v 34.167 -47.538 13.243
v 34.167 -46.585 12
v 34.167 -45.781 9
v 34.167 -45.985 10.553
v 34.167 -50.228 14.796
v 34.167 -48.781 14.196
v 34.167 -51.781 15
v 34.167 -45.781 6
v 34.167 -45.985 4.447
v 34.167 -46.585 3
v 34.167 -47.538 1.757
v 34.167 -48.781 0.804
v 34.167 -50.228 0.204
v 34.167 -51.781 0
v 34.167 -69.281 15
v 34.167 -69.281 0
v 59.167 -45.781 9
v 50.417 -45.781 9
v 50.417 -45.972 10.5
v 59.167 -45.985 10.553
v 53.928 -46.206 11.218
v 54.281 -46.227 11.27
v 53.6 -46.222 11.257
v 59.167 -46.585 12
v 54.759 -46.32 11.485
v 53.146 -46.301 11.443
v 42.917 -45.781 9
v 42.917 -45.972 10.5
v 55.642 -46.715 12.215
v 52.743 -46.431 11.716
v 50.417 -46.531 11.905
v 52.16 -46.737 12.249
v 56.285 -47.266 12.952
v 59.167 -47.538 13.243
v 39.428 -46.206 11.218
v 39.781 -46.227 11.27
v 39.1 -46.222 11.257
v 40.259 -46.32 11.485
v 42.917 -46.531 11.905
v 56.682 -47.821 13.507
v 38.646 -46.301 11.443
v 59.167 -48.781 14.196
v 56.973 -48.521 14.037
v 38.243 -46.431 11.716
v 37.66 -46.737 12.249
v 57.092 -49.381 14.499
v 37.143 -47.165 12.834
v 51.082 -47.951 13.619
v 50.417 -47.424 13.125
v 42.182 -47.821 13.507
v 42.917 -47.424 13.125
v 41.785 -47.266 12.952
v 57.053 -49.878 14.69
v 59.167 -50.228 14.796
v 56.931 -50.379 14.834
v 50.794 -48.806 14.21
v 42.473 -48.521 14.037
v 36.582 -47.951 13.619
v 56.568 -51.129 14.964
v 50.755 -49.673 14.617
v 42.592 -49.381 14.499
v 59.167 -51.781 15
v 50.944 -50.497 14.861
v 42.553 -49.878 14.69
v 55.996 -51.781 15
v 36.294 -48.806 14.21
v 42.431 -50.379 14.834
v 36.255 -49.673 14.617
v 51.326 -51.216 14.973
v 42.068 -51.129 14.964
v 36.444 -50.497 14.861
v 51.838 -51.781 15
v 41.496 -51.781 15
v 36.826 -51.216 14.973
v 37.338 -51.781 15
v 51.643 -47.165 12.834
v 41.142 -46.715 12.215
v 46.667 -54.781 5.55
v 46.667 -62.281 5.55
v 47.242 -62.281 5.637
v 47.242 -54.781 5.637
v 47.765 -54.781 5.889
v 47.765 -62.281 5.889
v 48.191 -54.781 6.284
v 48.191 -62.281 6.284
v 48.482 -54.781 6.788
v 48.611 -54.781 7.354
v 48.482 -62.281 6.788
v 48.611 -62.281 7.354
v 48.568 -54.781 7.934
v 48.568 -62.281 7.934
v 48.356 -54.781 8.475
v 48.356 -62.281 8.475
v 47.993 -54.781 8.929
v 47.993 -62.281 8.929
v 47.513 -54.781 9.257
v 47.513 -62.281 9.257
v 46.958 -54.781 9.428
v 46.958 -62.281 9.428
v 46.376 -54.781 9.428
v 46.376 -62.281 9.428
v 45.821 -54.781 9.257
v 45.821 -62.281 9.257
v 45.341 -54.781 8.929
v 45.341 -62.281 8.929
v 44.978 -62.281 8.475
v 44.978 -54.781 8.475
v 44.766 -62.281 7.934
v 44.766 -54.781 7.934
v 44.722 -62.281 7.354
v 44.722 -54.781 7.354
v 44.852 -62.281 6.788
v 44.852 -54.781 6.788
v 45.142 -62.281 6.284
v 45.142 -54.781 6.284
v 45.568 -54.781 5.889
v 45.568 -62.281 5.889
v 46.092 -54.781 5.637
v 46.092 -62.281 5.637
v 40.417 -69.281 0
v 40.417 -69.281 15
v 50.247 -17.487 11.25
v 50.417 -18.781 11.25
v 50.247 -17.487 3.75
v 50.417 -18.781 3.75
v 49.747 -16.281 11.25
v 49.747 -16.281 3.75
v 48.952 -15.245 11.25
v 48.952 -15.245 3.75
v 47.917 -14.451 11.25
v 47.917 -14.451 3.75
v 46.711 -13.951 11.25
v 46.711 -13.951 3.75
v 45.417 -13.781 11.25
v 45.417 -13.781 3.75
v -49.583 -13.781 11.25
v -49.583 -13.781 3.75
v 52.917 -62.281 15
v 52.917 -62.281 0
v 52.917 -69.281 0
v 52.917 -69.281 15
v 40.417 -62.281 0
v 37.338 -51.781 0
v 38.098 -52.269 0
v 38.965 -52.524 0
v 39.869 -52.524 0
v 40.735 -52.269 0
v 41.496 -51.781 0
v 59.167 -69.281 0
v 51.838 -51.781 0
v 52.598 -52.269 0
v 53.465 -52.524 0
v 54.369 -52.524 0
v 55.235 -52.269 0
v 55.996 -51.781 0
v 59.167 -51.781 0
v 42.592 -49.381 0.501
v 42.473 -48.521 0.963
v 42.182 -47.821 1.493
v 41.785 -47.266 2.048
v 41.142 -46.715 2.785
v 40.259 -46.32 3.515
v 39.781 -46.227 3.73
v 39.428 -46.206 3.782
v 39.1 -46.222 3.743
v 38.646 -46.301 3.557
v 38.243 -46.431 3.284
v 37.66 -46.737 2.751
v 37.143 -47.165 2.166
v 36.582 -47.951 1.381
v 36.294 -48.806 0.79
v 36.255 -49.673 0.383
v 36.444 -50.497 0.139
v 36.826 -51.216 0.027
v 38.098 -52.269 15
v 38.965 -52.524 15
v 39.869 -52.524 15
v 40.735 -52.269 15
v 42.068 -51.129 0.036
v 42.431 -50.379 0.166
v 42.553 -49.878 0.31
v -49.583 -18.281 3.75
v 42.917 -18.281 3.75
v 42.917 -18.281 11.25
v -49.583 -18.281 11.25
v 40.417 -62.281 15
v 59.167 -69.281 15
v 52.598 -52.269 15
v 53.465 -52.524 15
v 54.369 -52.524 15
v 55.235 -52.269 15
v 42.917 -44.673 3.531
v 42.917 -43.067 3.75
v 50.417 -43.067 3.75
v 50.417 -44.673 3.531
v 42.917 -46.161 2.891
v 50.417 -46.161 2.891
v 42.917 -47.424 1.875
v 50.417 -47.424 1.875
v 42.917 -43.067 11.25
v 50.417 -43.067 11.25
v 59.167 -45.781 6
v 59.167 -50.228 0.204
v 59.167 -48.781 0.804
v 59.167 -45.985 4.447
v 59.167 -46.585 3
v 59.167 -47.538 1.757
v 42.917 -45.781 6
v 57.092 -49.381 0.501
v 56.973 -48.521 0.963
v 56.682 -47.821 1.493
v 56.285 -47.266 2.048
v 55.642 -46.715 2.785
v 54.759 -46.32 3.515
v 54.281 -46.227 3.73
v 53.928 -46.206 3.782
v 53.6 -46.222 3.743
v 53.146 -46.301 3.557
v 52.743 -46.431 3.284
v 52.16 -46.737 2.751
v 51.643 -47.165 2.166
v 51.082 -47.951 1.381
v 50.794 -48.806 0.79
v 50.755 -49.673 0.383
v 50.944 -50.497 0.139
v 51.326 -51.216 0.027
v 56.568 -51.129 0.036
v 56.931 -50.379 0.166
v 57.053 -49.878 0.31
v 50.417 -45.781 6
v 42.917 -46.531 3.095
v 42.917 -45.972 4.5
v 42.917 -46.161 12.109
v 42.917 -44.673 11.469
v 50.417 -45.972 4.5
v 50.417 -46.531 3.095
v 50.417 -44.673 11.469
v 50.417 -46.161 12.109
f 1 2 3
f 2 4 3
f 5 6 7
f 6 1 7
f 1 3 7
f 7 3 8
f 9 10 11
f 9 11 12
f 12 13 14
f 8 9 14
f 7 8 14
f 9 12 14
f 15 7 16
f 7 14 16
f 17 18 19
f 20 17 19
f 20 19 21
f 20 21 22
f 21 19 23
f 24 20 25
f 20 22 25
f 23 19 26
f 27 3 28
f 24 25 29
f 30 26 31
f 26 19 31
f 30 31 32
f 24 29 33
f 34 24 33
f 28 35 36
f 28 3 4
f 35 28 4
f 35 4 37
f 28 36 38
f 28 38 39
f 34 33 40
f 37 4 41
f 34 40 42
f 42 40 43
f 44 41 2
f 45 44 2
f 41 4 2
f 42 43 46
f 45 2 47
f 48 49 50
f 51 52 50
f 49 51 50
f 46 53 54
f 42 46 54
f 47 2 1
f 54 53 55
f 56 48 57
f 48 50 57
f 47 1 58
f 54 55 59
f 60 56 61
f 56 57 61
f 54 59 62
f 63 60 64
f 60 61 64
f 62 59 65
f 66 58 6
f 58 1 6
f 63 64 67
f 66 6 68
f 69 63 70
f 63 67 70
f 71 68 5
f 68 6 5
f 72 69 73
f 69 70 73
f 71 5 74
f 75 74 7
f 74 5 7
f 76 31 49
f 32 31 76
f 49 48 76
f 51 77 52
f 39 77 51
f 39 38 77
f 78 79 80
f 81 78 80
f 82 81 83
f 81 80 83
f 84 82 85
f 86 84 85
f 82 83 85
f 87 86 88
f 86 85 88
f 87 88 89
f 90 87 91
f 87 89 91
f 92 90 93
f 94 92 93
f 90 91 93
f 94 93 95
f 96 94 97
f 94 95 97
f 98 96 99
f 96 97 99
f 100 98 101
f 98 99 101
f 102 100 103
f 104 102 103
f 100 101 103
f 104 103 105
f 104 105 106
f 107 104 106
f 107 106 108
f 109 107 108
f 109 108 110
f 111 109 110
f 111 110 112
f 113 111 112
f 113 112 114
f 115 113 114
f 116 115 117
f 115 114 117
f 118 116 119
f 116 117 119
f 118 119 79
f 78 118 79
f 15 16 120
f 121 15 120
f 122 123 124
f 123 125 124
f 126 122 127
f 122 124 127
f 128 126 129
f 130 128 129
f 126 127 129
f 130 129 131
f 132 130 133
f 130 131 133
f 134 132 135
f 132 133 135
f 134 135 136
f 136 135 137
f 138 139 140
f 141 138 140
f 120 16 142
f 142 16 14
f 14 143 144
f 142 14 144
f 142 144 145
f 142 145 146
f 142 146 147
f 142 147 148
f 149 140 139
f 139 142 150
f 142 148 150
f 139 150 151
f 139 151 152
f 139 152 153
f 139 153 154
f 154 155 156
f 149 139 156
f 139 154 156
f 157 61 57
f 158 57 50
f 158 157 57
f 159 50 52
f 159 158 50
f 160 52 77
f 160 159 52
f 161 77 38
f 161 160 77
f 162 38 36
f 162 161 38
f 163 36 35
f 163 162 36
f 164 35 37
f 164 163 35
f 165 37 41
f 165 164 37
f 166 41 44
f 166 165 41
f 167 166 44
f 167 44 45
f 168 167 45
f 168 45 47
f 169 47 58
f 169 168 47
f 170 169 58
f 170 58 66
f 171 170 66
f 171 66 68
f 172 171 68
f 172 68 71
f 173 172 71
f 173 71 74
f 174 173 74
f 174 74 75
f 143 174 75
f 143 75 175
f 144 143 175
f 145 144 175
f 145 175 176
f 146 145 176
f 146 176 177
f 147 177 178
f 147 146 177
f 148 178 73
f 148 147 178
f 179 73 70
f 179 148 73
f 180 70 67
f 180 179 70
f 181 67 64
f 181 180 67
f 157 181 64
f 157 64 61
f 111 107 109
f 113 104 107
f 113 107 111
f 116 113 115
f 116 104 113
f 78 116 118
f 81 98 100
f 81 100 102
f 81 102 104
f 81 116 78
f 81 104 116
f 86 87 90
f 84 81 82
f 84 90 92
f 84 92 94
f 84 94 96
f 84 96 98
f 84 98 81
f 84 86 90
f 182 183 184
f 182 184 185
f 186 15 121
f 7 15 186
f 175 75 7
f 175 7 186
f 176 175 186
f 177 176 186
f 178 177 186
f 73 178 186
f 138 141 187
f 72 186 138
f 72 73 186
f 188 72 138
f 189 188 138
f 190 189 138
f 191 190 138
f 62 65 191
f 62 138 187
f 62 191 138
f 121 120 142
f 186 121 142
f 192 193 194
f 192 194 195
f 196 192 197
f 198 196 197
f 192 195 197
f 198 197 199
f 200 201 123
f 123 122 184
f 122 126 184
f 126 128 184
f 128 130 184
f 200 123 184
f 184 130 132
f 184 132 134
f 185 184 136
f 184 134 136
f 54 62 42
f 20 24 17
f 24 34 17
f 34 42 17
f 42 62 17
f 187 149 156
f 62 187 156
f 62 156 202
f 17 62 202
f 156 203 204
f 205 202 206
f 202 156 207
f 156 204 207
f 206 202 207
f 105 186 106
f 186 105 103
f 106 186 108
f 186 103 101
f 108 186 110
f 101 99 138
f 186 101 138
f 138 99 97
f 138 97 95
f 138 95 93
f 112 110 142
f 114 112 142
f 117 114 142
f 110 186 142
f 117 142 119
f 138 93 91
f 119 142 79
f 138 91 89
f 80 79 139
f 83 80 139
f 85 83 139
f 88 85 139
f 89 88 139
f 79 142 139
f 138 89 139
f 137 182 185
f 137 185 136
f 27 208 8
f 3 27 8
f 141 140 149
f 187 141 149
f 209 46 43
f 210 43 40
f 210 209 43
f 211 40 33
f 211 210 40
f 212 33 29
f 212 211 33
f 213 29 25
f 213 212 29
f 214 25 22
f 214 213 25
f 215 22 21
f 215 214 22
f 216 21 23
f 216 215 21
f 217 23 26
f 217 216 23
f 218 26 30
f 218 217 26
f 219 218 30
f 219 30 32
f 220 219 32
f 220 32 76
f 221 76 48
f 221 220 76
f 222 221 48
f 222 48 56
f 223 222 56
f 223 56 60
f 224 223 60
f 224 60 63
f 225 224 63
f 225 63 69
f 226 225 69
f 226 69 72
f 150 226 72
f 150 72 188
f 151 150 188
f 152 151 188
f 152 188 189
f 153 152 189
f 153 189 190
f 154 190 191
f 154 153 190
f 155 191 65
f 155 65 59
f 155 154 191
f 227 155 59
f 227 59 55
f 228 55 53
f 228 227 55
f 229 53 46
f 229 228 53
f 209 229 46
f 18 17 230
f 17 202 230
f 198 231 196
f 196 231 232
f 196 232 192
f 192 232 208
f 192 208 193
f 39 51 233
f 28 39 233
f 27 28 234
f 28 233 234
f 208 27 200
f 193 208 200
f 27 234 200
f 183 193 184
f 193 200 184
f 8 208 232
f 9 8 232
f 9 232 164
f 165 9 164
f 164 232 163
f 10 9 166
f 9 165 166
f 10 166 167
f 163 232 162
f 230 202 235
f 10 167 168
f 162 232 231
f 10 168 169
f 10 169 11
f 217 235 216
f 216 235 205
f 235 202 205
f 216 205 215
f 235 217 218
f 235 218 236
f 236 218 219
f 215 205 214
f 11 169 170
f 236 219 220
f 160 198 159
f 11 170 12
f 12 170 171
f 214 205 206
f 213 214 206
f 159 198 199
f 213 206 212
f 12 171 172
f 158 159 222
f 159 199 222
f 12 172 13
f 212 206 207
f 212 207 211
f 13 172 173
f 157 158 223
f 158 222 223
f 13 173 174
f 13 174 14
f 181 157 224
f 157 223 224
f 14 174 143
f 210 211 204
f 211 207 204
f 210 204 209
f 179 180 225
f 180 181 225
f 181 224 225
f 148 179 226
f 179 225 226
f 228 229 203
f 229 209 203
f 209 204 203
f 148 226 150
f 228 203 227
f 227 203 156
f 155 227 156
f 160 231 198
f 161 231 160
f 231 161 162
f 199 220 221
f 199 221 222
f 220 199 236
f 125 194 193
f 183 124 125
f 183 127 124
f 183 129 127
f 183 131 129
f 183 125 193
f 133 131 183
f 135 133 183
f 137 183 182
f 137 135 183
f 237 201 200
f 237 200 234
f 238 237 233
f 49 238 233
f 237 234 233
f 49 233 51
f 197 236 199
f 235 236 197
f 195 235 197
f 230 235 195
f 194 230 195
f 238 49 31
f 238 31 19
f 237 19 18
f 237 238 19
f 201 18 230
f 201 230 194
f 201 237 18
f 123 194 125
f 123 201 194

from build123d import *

# Parameters (mm, degrees)
SKETCH1_R           = 3.175
PUSHER_BASE_DEPTH   = 15
SKETCH3_R           = 1.95
SCREW_HOLE_DEPTH    = 7.5
SKETCH6_W           = 7.5
SKETCH6_H           = 32
PUSHER_HEAD_DEPTH   = 3.75
FILLET1_R           = 6
FILLET5_R           = 6
FILLET6_R           = 6
SKETCH8_W           = 92.5
SKETCH8_H           = 4.5
BOSS_EXTRUDE1_DEPTH = 7.5
FILLET7_R           = 5


with BuildPart() as part:
    # Sketch1 → pusher base (new body)
    with BuildSketch(Plane.XY):
        Polygon((59.166899441, -45.781018283), (51.666899441, -45.781018283), (41.666899441, -45.781018283), (34.166899441, -45.781018283), (34.166899441, -69.281018283), (40.416899441, -69.281018283), (40.416899441, -62.281018283), (52.916899441, -62.281018283), (52.916899441, -69.281018283), (59.166899441, -69.281018283), align=None)
        with Locations((39.416899441, -49.381018283)):
            Circle(SKETCH1_R, mode=Mode.SUBTRACT)
        with Locations((53.916899441, -49.381018283)):
            Circle(SKETCH1_R, mode=Mode.SUBTRACT)
    extrude(amount=PUSHER_BASE_DEPTH)

    # Sketch3 → screw hole (cut)
    with BuildSketch(Plane.XZ.offset(62.281018283)):
        with Locations(Location((46.666899441, 7.5, 0), (0, 0, 270))):
            Circle(SKETCH3_R)
    extrude(amount=-SCREW_HOLE_DEPTH, mode=Mode.SUBTRACT)

    # Sketch6 → pusher head (add, symmetric)
    with BuildSketch(Plane.XY.offset(7.5)):
        with Locations((46.666899441, -29.781018283)):
            Rectangle(SKETCH6_W, SKETCH6_H)
    extrude(amount=PUSHER_HEAD_DEPTH, both=True)

    # Fillet1
    # the kernel refuses this fillet: 6 mm, written as the material it takes off along each edge
    with BuildSketch(Plane(origin=(74.166899441, -45.781018283, 0), x_dir=(0, 0, 1), z_dir=(-1, 0, 0))) as fillet1_piece_1_section:
        with BuildLine():
            CenterArc((FILLET1_R, -FILLET1_R), FILLET1_R, 90, 90)
            Line((0, -FILLET1_R), (0, 0))
            Line((0, 0), (FILLET1_R, 0))
        make_face()
    fillet1_piece_1 = extrude(amount=55, mode=Mode.PRIVATE)
    fillet1_piece_1 = split(fillet1_piece_1, bisect_by=Plane(origin=(62.291899441, -45.824840722, 3.75), z_dir=(0, 0, 1)), keep=Keep.TOP, mode=Mode.PRIVATE)
    fillet1_piece_1 = split(fillet1_piece_1, bisect_by=Plane(origin=(50.416899441, -45.824840722, 4.566140917), z_dir=(1, 0, 0)), keep=Keep.TOP, mode=Mode.PRIVATE)
    add(fillet1_piece_1, mode=Mode.SUBTRACT)
    with BuildSketch(Plane(origin=(74.166899441, -45.781018283, 0), x_dir=(0, 0, 1), z_dir=(-1, 0, 0))) as fillet1_piece_2_section:
        with BuildLine():
            CenterArc((FILLET1_R, -FILLET1_R), FILLET1_R, 90, 90)
            Line((0, -FILLET1_R), (0, 0))
            Line((0, 0), (FILLET1_R, 0))
        make_face()
    fillet1_piece_2 = extrude(amount=55, mode=Mode.PRIVATE)
    fillet1_piece_2 = split(fillet1_piece_2, bisect_by=Plane(origin=(62.291899441, -47.230240291, 3.75), z_dir=(0, 0, -1)), keep=Keep.TOP, mode=Mode.PRIVATE)
    fillet1_piece_2 = split(fillet1_piece_2, bisect_by=Plane(origin=(50.416899441, -47.230240291, 1.136674626), z_dir=(1, 0, 0)), keep=Keep.TOP, mode=Mode.PRIVATE)
    add(fillet1_piece_2, mode=Mode.SUBTRACT)
    with BuildSketch(Plane(origin=(74.166899441, -45.781018283, 0), x_dir=(0, 0, 1), z_dir=(-1, 0, 0))) as fillet1_piece_3_section:
        with BuildLine():
            CenterArc((FILLET1_R, -FILLET1_R), FILLET1_R, 90, 90)
            Line((0, -FILLET1_R), (0, 0))
            Line((0, 0), (FILLET1_R, 0))
        make_face()
    fillet1_piece_3 = extrude(amount=55, mode=Mode.PRIVATE)
    fillet1_piece_3 = split(fillet1_piece_3, bisect_by=Plane(origin=(46.666899441, -47.230240291, 3.75), z_dir=(0, 0, -1)), keep=Keep.TOP, mode=Mode.PRIVATE)
    fillet1_piece_3 = split(fillet1_piece_3, bisect_by=Plane(origin=(50.416899441, -47.230240291, 1.136674626), z_dir=(-1, 0, 0)), keep=Keep.TOP, mode=Mode.PRIVATE)
    fillet1_piece_3 = split(fillet1_piece_3, bisect_by=Plane(origin=(42.916899441, -47.230240291, 1.136674626), z_dir=(1, 0, 0)), keep=Keep.TOP, mode=Mode.PRIVATE)
    add(fillet1_piece_3, mode=Mode.SUBTRACT)
    with BuildSketch(Plane(origin=(74.166899441, -45.781018283, 0), x_dir=(0, 0, 1), z_dir=(-1, 0, 0))) as fillet1_piece_4_section:
        with BuildLine():
            CenterArc((FILLET1_R, -FILLET1_R), FILLET1_R, 90, 90)
            Line((0, -FILLET1_R), (0, 0))
            Line((0, 0), (FILLET1_R, 0))
        make_face()
    fillet1_piece_4 = extrude(amount=55, mode=Mode.PRIVATE)
    fillet1_piece_4 = split(fillet1_piece_4, bisect_by=Plane(origin=(31.041899441, -45.824840722, 3.75), z_dir=(0, 0, 1)), keep=Keep.TOP, mode=Mode.PRIVATE)
    fillet1_piece_4 = split(fillet1_piece_4, bisect_by=Plane(origin=(42.916899441, -45.824840722, 4.566140917), z_dir=(-1, 0, 0)), keep=Keep.TOP, mode=Mode.PRIVATE)
    add(fillet1_piece_4, mode=Mode.SUBTRACT)
    with BuildSketch(Plane(origin=(74.166899441, -45.781018283, 0), x_dir=(0, 0, 1), z_dir=(-1, 0, 0))) as fillet1_piece_5_section:
        with BuildLine():
            CenterArc((FILLET1_R, -FILLET1_R), FILLET1_R, 90, 90)
            Line((0, -FILLET1_R), (0, 0))
            Line((0, 0), (FILLET1_R, 0))
        make_face()
    fillet1_piece_5 = extrude(amount=55, mode=Mode.PRIVATE)
    fillet1_piece_5 = split(fillet1_piece_5, bisect_by=Plane(origin=(31.041899441, -47.230240291, 3.75), z_dir=(0, 0, -1)), keep=Keep.TOP, mode=Mode.PRIVATE)
    fillet1_piece_5 = split(fillet1_piece_5, bisect_by=Plane(origin=(42.916899441, -47.230240291, 1.136674626), z_dir=(-1, 0, 0)), keep=Keep.TOP, mode=Mode.PRIVATE)
    add(fillet1_piece_5, mode=Mode.SUBTRACT)
    with BuildSketch(Plane(origin=(19.166899441, -45.781018283, 15), x_dir=(0, 0, -1), z_dir=(1, 0, 0))) as fillet1_piece_6_section:
        with BuildLine():
            CenterArc((FILLET1_R, -FILLET1_R), FILLET1_R, 90, 90)
            Line((0, -FILLET1_R), (0, 0))
            Line((0, 0), (FILLET1_R, 0))
        make_face()
    fillet1_piece_6 = extrude(amount=55, mode=Mode.PRIVATE)
    fillet1_piece_6 = split(fillet1_piece_6, bisect_by=Plane(origin=(31.041899441, -45.824840722, 11.25), z_dir=(0, 0, -1)), keep=Keep.TOP, mode=Mode.PRIVATE)
    fillet1_piece_6 = split(fillet1_piece_6, bisect_by=Plane(origin=(42.916899441, -45.824840722, 10.433859083), z_dir=(-1, 0, 0)), keep=Keep.TOP, mode=Mode.PRIVATE)
    add(fillet1_piece_6, mode=Mode.SUBTRACT)
    with BuildSketch(Plane(origin=(19.166899441, -45.781018283, 15), x_dir=(0, 0, -1), z_dir=(1, 0, 0))) as fillet1_piece_7_section:
        with BuildLine():
            CenterArc((FILLET1_R, -FILLET1_R), FILLET1_R, 90, 90)
            Line((0, -FILLET1_R), (0, 0))
            Line((0, 0), (FILLET1_R, 0))
        make_face()
    fillet1_piece_7 = extrude(amount=55, mode=Mode.PRIVATE)
    fillet1_piece_7 = split(fillet1_piece_7, bisect_by=Plane(origin=(31.041899441, -47.230240291, 11.25), z_dir=(0, 0, 1)), keep=Keep.TOP, mode=Mode.PRIVATE)
    fillet1_piece_7 = split(fillet1_piece_7, bisect_by=Plane(origin=(42.916899441, -47.230240291, 13.863325374), z_dir=(-1, 0, 0)), keep=Keep.TOP, mode=Mode.PRIVATE)
    add(fillet1_piece_7, mode=Mode.SUBTRACT)
    with BuildSketch(Plane(origin=(19.166899441, -45.781018283, 15), x_dir=(0, 0, -1), z_dir=(1, 0, 0))) as fillet1_piece_8_section:
        with BuildLine():
            CenterArc((FILLET1_R, -FILLET1_R), FILLET1_R, 90, 90)
            Line((0, -FILLET1_R), (0, 0))
            Line((0, 0), (FILLET1_R, 0))
        make_face()
    fillet1_piece_8 = extrude(amount=55, mode=Mode.PRIVATE)
    fillet1_piece_8 = split(fillet1_piece_8, bisect_by=Plane(origin=(50.416899441, -47.230240291, 13.863325374), z_dir=(-1, 0, 0)), keep=Keep.TOP, mode=Mode.PRIVATE)
    fillet1_piece_8 = split(fillet1_piece_8, bisect_by=Plane(origin=(46.666899441, -47.230240291, 11.25), z_dir=(0, 0, 1)), keep=Keep.TOP, mode=Mode.PRIVATE)
    fillet1_piece_8 = split(fillet1_piece_8, bisect_by=Plane(origin=(42.916899441, -47.230240291, 13.863325374), z_dir=(1, 0, 0)), keep=Keep.TOP, mode=Mode.PRIVATE)
    add(fillet1_piece_8, mode=Mode.SUBTRACT)
    with BuildSketch(Plane(origin=(19.166899441, -45.781018283, 15), x_dir=(0, 0, -1), z_dir=(1, 0, 0))) as fillet1_piece_9_section:
        with BuildLine():
            CenterArc((FILLET1_R, -FILLET1_R), FILLET1_R, 90, 90)
            Line((0, -FILLET1_R), (0, 0))
            Line((0, 0), (FILLET1_R, 0))
        make_face()
    fillet1_piece_9 = extrude(amount=55, mode=Mode.PRIVATE)
    fillet1_piece_9 = split(fillet1_piece_9, bisect_by=Plane(origin=(50.416899441, -45.824840722, 10.433859083), z_dir=(1, 0, 0)), keep=Keep.TOP, mode=Mode.PRIVATE)
    fillet1_piece_9 = split(fillet1_piece_9, bisect_by=Plane(origin=(62.291899441, -45.824840722, 11.25), z_dir=(0, 0, -1)), keep=Keep.TOP, mode=Mode.PRIVATE)
    add(fillet1_piece_9, mode=Mode.SUBTRACT)
    with BuildSketch(Plane(origin=(19.166899441, -45.781018283, 15), x_dir=(0, 0, -1), z_dir=(1, 0, 0))) as fillet1_piece_10_section:
        with BuildLine():
            CenterArc((FILLET1_R, -FILLET1_R), FILLET1_R, 90, 90)
            Line((0, -FILLET1_R), (0, 0))
            Line((0, 0), (FILLET1_R, 0))
        make_face()
    fillet1_piece_10 = extrude(amount=55, mode=Mode.PRIVATE)
    fillet1_piece_10 = split(fillet1_piece_10, bisect_by=Plane(origin=(50.416899441, -47.230240291, 13.863325374), z_dir=(1, 0, 0)), keep=Keep.TOP, mode=Mode.PRIVATE)
    fillet1_piece_10 = split(fillet1_piece_10, bisect_by=Plane(origin=(62.291899441, -47.230240291, 11.25), z_dir=(0, 0, 1)), keep=Keep.TOP, mode=Mode.PRIVATE)
    add(fillet1_piece_10, mode=Mode.SUBTRACT)

    # Fillet5
    fillet5_edges = [part.edges().sort_by_distance(p)[0] for p in [
        (46.666899441, -46.218869418, 11.25),
    ]]
    fillet(fillet5_edges, radius=FILLET5_R)

    # Fillet6
    fillet6_edges = [part.edges().sort_by_distance(p)[0] for p in [
        (46.666899441, -46.218869418, 3.75),
    ]]
    fillet(fillet6_edges, radius=FILLET6_R)

    # Sketch8 → Boss-Extrude1 (add)
    with BuildSketch(Plane(origin=(0, 0, 3.75), x_dir=(-1, 0, 0), z_dir=(0, 0, -1))):
        with Locations((3.333100559, -16.031018283)):
            Rectangle(SKETCH8_W, SKETCH8_H)
    extrude(amount=-BOSS_EXTRUDE1_DEPTH)

    # Fillet7
    fillet7_edges = [part.edges().sort_by_distance(p)[0] for p in [
        (50.416899441, -13.781018283, 7.5),
    ]]
    fillet(fillet7_edges, radius=FILLET7_R)


solid = part.part
